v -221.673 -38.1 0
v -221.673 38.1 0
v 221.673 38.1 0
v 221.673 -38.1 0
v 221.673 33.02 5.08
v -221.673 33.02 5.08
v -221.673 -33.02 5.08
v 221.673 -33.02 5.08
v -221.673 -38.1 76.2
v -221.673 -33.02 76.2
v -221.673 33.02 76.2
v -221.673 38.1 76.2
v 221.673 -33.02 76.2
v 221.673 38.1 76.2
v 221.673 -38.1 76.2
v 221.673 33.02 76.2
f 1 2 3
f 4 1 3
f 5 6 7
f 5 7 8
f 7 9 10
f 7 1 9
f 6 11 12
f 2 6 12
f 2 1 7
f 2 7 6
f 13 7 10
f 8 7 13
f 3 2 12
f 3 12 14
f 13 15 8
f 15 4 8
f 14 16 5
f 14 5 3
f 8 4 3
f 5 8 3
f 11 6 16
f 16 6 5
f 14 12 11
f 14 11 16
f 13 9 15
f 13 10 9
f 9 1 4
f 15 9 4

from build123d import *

# Parameters (mm, degrees)
F0_W     = 443.345444
F0_H     = 76.2
F1_DEPTH = 76.2
F2_T     = -5.08


with BuildPart() as f1:
    # F0 (on Top) → F1 (new body)
    with BuildSketch(Plane.XY):
        Rectangle(F0_W, F0_H)
    extrude(amount=F1_DEPTH)

    # F2
    f2_openings = [f1.faces().sort_by_distance(p)[0] for p in [
        (0, 0, 76.2),
        (-221.672722, 0, 38.1),
        (221.672722, 0, 38.1),
    ]]
    offset(amount=F2_T, openings=f2_openings)


solid = f1.part
